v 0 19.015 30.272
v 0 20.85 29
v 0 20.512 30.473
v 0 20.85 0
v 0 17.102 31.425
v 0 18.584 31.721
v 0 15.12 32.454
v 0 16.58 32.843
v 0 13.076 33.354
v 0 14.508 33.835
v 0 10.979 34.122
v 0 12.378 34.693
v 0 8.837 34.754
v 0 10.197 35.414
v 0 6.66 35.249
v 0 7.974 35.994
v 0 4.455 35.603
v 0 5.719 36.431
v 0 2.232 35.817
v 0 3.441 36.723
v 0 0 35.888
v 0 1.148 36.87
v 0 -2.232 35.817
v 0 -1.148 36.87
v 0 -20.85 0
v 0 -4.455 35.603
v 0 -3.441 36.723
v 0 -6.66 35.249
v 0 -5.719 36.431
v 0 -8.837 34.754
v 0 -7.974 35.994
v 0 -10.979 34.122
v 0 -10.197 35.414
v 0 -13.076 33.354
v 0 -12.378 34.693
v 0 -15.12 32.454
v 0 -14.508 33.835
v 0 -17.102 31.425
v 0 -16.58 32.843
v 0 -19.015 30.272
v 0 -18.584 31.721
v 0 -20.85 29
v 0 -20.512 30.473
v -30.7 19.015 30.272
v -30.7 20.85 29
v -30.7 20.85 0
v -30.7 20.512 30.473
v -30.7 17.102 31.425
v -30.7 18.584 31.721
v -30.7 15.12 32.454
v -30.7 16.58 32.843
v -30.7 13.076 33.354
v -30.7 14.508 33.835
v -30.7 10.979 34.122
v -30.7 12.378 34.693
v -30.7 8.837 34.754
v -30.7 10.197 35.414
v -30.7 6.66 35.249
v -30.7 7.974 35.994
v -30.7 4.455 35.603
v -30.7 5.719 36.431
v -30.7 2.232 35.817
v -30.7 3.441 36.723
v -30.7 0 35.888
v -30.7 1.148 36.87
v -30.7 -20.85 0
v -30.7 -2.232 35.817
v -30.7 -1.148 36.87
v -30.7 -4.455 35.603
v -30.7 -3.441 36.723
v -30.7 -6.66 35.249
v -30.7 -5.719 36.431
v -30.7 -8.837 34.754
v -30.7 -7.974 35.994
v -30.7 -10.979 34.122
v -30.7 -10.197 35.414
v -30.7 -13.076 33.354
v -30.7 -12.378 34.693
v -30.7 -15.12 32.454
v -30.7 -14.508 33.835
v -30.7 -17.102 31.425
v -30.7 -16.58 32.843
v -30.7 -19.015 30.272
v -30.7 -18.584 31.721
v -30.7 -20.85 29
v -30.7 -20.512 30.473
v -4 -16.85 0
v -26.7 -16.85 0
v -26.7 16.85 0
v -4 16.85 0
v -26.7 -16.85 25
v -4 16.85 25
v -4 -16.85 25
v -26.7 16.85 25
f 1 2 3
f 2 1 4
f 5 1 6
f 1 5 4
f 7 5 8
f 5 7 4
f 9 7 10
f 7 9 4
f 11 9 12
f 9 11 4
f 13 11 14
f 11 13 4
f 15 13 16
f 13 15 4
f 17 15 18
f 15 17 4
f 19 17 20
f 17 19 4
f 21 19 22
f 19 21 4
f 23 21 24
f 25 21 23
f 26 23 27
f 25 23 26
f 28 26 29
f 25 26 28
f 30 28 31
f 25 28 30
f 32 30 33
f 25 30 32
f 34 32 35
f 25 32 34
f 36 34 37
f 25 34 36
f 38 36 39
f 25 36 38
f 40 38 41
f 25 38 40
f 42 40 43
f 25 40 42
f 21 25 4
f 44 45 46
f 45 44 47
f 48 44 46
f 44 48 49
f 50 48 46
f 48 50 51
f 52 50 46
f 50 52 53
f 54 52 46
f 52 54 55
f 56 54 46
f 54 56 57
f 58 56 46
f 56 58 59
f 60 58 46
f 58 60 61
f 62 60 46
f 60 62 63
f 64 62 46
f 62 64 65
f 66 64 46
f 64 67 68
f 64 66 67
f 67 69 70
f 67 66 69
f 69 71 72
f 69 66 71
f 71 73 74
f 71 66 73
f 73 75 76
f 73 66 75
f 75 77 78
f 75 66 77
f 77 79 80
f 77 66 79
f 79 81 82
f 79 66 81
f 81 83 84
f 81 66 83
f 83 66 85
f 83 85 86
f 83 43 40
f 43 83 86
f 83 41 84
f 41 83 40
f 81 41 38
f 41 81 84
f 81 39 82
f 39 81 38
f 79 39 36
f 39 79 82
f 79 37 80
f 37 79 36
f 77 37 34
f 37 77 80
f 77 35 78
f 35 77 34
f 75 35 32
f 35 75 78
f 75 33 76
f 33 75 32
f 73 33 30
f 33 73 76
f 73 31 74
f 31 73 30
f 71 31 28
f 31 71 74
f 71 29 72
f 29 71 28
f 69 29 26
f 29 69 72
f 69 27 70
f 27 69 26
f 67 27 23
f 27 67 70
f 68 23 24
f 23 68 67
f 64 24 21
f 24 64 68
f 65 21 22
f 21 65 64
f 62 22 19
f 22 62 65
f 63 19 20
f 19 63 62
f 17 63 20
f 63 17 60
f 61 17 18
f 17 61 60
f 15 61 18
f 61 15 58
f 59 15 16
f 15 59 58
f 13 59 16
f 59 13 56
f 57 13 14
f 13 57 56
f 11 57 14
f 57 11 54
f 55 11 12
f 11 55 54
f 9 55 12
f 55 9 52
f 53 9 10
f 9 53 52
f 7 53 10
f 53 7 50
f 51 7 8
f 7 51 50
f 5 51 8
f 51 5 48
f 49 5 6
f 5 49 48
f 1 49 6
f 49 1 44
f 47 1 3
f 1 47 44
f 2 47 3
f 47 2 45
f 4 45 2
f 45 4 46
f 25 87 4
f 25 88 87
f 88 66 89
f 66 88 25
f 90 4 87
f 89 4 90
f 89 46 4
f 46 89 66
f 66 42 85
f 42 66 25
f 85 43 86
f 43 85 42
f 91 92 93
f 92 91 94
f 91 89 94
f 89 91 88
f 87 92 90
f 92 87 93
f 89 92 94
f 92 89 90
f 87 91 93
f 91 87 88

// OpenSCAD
width=22.7;
length=33.7;
thickness=4;
end_rad=35;
no_teeth=20;
tooth_depth=1;
hole_depth=25;

b=width;
l=length;
gods=thickness;
angle=asin((l/2+gods)/end_rad);

points=[for (a=[angle:-2*angle/no_teeth:-angle]) for (b=[0:1]) (end_rad+tooth_depth*b)*[cos(a-(b*angle/no_teeth)),sin(a-(b*angle/no_teeth))]];
    
polypoints=concat([[end_rad*cos(angle),-end_rad*sin(angle)],[end_rad*cos(angle)-gods-hole_depth,-end_rad*sin(angle)],[end_rad*cos(angle)-gods-hole_depth,end_rad*sin(angle)]], points);

rotate([0,-90,0]) difference() {
linear_extrude(b+2*gods,convexity=10) translate([-end_rad*cos(angle)+gods+hole_depth,0,0]) polygon(polypoints);
translate([0,-l/2,gods]) cube([hole_depth,l,b]);
}
